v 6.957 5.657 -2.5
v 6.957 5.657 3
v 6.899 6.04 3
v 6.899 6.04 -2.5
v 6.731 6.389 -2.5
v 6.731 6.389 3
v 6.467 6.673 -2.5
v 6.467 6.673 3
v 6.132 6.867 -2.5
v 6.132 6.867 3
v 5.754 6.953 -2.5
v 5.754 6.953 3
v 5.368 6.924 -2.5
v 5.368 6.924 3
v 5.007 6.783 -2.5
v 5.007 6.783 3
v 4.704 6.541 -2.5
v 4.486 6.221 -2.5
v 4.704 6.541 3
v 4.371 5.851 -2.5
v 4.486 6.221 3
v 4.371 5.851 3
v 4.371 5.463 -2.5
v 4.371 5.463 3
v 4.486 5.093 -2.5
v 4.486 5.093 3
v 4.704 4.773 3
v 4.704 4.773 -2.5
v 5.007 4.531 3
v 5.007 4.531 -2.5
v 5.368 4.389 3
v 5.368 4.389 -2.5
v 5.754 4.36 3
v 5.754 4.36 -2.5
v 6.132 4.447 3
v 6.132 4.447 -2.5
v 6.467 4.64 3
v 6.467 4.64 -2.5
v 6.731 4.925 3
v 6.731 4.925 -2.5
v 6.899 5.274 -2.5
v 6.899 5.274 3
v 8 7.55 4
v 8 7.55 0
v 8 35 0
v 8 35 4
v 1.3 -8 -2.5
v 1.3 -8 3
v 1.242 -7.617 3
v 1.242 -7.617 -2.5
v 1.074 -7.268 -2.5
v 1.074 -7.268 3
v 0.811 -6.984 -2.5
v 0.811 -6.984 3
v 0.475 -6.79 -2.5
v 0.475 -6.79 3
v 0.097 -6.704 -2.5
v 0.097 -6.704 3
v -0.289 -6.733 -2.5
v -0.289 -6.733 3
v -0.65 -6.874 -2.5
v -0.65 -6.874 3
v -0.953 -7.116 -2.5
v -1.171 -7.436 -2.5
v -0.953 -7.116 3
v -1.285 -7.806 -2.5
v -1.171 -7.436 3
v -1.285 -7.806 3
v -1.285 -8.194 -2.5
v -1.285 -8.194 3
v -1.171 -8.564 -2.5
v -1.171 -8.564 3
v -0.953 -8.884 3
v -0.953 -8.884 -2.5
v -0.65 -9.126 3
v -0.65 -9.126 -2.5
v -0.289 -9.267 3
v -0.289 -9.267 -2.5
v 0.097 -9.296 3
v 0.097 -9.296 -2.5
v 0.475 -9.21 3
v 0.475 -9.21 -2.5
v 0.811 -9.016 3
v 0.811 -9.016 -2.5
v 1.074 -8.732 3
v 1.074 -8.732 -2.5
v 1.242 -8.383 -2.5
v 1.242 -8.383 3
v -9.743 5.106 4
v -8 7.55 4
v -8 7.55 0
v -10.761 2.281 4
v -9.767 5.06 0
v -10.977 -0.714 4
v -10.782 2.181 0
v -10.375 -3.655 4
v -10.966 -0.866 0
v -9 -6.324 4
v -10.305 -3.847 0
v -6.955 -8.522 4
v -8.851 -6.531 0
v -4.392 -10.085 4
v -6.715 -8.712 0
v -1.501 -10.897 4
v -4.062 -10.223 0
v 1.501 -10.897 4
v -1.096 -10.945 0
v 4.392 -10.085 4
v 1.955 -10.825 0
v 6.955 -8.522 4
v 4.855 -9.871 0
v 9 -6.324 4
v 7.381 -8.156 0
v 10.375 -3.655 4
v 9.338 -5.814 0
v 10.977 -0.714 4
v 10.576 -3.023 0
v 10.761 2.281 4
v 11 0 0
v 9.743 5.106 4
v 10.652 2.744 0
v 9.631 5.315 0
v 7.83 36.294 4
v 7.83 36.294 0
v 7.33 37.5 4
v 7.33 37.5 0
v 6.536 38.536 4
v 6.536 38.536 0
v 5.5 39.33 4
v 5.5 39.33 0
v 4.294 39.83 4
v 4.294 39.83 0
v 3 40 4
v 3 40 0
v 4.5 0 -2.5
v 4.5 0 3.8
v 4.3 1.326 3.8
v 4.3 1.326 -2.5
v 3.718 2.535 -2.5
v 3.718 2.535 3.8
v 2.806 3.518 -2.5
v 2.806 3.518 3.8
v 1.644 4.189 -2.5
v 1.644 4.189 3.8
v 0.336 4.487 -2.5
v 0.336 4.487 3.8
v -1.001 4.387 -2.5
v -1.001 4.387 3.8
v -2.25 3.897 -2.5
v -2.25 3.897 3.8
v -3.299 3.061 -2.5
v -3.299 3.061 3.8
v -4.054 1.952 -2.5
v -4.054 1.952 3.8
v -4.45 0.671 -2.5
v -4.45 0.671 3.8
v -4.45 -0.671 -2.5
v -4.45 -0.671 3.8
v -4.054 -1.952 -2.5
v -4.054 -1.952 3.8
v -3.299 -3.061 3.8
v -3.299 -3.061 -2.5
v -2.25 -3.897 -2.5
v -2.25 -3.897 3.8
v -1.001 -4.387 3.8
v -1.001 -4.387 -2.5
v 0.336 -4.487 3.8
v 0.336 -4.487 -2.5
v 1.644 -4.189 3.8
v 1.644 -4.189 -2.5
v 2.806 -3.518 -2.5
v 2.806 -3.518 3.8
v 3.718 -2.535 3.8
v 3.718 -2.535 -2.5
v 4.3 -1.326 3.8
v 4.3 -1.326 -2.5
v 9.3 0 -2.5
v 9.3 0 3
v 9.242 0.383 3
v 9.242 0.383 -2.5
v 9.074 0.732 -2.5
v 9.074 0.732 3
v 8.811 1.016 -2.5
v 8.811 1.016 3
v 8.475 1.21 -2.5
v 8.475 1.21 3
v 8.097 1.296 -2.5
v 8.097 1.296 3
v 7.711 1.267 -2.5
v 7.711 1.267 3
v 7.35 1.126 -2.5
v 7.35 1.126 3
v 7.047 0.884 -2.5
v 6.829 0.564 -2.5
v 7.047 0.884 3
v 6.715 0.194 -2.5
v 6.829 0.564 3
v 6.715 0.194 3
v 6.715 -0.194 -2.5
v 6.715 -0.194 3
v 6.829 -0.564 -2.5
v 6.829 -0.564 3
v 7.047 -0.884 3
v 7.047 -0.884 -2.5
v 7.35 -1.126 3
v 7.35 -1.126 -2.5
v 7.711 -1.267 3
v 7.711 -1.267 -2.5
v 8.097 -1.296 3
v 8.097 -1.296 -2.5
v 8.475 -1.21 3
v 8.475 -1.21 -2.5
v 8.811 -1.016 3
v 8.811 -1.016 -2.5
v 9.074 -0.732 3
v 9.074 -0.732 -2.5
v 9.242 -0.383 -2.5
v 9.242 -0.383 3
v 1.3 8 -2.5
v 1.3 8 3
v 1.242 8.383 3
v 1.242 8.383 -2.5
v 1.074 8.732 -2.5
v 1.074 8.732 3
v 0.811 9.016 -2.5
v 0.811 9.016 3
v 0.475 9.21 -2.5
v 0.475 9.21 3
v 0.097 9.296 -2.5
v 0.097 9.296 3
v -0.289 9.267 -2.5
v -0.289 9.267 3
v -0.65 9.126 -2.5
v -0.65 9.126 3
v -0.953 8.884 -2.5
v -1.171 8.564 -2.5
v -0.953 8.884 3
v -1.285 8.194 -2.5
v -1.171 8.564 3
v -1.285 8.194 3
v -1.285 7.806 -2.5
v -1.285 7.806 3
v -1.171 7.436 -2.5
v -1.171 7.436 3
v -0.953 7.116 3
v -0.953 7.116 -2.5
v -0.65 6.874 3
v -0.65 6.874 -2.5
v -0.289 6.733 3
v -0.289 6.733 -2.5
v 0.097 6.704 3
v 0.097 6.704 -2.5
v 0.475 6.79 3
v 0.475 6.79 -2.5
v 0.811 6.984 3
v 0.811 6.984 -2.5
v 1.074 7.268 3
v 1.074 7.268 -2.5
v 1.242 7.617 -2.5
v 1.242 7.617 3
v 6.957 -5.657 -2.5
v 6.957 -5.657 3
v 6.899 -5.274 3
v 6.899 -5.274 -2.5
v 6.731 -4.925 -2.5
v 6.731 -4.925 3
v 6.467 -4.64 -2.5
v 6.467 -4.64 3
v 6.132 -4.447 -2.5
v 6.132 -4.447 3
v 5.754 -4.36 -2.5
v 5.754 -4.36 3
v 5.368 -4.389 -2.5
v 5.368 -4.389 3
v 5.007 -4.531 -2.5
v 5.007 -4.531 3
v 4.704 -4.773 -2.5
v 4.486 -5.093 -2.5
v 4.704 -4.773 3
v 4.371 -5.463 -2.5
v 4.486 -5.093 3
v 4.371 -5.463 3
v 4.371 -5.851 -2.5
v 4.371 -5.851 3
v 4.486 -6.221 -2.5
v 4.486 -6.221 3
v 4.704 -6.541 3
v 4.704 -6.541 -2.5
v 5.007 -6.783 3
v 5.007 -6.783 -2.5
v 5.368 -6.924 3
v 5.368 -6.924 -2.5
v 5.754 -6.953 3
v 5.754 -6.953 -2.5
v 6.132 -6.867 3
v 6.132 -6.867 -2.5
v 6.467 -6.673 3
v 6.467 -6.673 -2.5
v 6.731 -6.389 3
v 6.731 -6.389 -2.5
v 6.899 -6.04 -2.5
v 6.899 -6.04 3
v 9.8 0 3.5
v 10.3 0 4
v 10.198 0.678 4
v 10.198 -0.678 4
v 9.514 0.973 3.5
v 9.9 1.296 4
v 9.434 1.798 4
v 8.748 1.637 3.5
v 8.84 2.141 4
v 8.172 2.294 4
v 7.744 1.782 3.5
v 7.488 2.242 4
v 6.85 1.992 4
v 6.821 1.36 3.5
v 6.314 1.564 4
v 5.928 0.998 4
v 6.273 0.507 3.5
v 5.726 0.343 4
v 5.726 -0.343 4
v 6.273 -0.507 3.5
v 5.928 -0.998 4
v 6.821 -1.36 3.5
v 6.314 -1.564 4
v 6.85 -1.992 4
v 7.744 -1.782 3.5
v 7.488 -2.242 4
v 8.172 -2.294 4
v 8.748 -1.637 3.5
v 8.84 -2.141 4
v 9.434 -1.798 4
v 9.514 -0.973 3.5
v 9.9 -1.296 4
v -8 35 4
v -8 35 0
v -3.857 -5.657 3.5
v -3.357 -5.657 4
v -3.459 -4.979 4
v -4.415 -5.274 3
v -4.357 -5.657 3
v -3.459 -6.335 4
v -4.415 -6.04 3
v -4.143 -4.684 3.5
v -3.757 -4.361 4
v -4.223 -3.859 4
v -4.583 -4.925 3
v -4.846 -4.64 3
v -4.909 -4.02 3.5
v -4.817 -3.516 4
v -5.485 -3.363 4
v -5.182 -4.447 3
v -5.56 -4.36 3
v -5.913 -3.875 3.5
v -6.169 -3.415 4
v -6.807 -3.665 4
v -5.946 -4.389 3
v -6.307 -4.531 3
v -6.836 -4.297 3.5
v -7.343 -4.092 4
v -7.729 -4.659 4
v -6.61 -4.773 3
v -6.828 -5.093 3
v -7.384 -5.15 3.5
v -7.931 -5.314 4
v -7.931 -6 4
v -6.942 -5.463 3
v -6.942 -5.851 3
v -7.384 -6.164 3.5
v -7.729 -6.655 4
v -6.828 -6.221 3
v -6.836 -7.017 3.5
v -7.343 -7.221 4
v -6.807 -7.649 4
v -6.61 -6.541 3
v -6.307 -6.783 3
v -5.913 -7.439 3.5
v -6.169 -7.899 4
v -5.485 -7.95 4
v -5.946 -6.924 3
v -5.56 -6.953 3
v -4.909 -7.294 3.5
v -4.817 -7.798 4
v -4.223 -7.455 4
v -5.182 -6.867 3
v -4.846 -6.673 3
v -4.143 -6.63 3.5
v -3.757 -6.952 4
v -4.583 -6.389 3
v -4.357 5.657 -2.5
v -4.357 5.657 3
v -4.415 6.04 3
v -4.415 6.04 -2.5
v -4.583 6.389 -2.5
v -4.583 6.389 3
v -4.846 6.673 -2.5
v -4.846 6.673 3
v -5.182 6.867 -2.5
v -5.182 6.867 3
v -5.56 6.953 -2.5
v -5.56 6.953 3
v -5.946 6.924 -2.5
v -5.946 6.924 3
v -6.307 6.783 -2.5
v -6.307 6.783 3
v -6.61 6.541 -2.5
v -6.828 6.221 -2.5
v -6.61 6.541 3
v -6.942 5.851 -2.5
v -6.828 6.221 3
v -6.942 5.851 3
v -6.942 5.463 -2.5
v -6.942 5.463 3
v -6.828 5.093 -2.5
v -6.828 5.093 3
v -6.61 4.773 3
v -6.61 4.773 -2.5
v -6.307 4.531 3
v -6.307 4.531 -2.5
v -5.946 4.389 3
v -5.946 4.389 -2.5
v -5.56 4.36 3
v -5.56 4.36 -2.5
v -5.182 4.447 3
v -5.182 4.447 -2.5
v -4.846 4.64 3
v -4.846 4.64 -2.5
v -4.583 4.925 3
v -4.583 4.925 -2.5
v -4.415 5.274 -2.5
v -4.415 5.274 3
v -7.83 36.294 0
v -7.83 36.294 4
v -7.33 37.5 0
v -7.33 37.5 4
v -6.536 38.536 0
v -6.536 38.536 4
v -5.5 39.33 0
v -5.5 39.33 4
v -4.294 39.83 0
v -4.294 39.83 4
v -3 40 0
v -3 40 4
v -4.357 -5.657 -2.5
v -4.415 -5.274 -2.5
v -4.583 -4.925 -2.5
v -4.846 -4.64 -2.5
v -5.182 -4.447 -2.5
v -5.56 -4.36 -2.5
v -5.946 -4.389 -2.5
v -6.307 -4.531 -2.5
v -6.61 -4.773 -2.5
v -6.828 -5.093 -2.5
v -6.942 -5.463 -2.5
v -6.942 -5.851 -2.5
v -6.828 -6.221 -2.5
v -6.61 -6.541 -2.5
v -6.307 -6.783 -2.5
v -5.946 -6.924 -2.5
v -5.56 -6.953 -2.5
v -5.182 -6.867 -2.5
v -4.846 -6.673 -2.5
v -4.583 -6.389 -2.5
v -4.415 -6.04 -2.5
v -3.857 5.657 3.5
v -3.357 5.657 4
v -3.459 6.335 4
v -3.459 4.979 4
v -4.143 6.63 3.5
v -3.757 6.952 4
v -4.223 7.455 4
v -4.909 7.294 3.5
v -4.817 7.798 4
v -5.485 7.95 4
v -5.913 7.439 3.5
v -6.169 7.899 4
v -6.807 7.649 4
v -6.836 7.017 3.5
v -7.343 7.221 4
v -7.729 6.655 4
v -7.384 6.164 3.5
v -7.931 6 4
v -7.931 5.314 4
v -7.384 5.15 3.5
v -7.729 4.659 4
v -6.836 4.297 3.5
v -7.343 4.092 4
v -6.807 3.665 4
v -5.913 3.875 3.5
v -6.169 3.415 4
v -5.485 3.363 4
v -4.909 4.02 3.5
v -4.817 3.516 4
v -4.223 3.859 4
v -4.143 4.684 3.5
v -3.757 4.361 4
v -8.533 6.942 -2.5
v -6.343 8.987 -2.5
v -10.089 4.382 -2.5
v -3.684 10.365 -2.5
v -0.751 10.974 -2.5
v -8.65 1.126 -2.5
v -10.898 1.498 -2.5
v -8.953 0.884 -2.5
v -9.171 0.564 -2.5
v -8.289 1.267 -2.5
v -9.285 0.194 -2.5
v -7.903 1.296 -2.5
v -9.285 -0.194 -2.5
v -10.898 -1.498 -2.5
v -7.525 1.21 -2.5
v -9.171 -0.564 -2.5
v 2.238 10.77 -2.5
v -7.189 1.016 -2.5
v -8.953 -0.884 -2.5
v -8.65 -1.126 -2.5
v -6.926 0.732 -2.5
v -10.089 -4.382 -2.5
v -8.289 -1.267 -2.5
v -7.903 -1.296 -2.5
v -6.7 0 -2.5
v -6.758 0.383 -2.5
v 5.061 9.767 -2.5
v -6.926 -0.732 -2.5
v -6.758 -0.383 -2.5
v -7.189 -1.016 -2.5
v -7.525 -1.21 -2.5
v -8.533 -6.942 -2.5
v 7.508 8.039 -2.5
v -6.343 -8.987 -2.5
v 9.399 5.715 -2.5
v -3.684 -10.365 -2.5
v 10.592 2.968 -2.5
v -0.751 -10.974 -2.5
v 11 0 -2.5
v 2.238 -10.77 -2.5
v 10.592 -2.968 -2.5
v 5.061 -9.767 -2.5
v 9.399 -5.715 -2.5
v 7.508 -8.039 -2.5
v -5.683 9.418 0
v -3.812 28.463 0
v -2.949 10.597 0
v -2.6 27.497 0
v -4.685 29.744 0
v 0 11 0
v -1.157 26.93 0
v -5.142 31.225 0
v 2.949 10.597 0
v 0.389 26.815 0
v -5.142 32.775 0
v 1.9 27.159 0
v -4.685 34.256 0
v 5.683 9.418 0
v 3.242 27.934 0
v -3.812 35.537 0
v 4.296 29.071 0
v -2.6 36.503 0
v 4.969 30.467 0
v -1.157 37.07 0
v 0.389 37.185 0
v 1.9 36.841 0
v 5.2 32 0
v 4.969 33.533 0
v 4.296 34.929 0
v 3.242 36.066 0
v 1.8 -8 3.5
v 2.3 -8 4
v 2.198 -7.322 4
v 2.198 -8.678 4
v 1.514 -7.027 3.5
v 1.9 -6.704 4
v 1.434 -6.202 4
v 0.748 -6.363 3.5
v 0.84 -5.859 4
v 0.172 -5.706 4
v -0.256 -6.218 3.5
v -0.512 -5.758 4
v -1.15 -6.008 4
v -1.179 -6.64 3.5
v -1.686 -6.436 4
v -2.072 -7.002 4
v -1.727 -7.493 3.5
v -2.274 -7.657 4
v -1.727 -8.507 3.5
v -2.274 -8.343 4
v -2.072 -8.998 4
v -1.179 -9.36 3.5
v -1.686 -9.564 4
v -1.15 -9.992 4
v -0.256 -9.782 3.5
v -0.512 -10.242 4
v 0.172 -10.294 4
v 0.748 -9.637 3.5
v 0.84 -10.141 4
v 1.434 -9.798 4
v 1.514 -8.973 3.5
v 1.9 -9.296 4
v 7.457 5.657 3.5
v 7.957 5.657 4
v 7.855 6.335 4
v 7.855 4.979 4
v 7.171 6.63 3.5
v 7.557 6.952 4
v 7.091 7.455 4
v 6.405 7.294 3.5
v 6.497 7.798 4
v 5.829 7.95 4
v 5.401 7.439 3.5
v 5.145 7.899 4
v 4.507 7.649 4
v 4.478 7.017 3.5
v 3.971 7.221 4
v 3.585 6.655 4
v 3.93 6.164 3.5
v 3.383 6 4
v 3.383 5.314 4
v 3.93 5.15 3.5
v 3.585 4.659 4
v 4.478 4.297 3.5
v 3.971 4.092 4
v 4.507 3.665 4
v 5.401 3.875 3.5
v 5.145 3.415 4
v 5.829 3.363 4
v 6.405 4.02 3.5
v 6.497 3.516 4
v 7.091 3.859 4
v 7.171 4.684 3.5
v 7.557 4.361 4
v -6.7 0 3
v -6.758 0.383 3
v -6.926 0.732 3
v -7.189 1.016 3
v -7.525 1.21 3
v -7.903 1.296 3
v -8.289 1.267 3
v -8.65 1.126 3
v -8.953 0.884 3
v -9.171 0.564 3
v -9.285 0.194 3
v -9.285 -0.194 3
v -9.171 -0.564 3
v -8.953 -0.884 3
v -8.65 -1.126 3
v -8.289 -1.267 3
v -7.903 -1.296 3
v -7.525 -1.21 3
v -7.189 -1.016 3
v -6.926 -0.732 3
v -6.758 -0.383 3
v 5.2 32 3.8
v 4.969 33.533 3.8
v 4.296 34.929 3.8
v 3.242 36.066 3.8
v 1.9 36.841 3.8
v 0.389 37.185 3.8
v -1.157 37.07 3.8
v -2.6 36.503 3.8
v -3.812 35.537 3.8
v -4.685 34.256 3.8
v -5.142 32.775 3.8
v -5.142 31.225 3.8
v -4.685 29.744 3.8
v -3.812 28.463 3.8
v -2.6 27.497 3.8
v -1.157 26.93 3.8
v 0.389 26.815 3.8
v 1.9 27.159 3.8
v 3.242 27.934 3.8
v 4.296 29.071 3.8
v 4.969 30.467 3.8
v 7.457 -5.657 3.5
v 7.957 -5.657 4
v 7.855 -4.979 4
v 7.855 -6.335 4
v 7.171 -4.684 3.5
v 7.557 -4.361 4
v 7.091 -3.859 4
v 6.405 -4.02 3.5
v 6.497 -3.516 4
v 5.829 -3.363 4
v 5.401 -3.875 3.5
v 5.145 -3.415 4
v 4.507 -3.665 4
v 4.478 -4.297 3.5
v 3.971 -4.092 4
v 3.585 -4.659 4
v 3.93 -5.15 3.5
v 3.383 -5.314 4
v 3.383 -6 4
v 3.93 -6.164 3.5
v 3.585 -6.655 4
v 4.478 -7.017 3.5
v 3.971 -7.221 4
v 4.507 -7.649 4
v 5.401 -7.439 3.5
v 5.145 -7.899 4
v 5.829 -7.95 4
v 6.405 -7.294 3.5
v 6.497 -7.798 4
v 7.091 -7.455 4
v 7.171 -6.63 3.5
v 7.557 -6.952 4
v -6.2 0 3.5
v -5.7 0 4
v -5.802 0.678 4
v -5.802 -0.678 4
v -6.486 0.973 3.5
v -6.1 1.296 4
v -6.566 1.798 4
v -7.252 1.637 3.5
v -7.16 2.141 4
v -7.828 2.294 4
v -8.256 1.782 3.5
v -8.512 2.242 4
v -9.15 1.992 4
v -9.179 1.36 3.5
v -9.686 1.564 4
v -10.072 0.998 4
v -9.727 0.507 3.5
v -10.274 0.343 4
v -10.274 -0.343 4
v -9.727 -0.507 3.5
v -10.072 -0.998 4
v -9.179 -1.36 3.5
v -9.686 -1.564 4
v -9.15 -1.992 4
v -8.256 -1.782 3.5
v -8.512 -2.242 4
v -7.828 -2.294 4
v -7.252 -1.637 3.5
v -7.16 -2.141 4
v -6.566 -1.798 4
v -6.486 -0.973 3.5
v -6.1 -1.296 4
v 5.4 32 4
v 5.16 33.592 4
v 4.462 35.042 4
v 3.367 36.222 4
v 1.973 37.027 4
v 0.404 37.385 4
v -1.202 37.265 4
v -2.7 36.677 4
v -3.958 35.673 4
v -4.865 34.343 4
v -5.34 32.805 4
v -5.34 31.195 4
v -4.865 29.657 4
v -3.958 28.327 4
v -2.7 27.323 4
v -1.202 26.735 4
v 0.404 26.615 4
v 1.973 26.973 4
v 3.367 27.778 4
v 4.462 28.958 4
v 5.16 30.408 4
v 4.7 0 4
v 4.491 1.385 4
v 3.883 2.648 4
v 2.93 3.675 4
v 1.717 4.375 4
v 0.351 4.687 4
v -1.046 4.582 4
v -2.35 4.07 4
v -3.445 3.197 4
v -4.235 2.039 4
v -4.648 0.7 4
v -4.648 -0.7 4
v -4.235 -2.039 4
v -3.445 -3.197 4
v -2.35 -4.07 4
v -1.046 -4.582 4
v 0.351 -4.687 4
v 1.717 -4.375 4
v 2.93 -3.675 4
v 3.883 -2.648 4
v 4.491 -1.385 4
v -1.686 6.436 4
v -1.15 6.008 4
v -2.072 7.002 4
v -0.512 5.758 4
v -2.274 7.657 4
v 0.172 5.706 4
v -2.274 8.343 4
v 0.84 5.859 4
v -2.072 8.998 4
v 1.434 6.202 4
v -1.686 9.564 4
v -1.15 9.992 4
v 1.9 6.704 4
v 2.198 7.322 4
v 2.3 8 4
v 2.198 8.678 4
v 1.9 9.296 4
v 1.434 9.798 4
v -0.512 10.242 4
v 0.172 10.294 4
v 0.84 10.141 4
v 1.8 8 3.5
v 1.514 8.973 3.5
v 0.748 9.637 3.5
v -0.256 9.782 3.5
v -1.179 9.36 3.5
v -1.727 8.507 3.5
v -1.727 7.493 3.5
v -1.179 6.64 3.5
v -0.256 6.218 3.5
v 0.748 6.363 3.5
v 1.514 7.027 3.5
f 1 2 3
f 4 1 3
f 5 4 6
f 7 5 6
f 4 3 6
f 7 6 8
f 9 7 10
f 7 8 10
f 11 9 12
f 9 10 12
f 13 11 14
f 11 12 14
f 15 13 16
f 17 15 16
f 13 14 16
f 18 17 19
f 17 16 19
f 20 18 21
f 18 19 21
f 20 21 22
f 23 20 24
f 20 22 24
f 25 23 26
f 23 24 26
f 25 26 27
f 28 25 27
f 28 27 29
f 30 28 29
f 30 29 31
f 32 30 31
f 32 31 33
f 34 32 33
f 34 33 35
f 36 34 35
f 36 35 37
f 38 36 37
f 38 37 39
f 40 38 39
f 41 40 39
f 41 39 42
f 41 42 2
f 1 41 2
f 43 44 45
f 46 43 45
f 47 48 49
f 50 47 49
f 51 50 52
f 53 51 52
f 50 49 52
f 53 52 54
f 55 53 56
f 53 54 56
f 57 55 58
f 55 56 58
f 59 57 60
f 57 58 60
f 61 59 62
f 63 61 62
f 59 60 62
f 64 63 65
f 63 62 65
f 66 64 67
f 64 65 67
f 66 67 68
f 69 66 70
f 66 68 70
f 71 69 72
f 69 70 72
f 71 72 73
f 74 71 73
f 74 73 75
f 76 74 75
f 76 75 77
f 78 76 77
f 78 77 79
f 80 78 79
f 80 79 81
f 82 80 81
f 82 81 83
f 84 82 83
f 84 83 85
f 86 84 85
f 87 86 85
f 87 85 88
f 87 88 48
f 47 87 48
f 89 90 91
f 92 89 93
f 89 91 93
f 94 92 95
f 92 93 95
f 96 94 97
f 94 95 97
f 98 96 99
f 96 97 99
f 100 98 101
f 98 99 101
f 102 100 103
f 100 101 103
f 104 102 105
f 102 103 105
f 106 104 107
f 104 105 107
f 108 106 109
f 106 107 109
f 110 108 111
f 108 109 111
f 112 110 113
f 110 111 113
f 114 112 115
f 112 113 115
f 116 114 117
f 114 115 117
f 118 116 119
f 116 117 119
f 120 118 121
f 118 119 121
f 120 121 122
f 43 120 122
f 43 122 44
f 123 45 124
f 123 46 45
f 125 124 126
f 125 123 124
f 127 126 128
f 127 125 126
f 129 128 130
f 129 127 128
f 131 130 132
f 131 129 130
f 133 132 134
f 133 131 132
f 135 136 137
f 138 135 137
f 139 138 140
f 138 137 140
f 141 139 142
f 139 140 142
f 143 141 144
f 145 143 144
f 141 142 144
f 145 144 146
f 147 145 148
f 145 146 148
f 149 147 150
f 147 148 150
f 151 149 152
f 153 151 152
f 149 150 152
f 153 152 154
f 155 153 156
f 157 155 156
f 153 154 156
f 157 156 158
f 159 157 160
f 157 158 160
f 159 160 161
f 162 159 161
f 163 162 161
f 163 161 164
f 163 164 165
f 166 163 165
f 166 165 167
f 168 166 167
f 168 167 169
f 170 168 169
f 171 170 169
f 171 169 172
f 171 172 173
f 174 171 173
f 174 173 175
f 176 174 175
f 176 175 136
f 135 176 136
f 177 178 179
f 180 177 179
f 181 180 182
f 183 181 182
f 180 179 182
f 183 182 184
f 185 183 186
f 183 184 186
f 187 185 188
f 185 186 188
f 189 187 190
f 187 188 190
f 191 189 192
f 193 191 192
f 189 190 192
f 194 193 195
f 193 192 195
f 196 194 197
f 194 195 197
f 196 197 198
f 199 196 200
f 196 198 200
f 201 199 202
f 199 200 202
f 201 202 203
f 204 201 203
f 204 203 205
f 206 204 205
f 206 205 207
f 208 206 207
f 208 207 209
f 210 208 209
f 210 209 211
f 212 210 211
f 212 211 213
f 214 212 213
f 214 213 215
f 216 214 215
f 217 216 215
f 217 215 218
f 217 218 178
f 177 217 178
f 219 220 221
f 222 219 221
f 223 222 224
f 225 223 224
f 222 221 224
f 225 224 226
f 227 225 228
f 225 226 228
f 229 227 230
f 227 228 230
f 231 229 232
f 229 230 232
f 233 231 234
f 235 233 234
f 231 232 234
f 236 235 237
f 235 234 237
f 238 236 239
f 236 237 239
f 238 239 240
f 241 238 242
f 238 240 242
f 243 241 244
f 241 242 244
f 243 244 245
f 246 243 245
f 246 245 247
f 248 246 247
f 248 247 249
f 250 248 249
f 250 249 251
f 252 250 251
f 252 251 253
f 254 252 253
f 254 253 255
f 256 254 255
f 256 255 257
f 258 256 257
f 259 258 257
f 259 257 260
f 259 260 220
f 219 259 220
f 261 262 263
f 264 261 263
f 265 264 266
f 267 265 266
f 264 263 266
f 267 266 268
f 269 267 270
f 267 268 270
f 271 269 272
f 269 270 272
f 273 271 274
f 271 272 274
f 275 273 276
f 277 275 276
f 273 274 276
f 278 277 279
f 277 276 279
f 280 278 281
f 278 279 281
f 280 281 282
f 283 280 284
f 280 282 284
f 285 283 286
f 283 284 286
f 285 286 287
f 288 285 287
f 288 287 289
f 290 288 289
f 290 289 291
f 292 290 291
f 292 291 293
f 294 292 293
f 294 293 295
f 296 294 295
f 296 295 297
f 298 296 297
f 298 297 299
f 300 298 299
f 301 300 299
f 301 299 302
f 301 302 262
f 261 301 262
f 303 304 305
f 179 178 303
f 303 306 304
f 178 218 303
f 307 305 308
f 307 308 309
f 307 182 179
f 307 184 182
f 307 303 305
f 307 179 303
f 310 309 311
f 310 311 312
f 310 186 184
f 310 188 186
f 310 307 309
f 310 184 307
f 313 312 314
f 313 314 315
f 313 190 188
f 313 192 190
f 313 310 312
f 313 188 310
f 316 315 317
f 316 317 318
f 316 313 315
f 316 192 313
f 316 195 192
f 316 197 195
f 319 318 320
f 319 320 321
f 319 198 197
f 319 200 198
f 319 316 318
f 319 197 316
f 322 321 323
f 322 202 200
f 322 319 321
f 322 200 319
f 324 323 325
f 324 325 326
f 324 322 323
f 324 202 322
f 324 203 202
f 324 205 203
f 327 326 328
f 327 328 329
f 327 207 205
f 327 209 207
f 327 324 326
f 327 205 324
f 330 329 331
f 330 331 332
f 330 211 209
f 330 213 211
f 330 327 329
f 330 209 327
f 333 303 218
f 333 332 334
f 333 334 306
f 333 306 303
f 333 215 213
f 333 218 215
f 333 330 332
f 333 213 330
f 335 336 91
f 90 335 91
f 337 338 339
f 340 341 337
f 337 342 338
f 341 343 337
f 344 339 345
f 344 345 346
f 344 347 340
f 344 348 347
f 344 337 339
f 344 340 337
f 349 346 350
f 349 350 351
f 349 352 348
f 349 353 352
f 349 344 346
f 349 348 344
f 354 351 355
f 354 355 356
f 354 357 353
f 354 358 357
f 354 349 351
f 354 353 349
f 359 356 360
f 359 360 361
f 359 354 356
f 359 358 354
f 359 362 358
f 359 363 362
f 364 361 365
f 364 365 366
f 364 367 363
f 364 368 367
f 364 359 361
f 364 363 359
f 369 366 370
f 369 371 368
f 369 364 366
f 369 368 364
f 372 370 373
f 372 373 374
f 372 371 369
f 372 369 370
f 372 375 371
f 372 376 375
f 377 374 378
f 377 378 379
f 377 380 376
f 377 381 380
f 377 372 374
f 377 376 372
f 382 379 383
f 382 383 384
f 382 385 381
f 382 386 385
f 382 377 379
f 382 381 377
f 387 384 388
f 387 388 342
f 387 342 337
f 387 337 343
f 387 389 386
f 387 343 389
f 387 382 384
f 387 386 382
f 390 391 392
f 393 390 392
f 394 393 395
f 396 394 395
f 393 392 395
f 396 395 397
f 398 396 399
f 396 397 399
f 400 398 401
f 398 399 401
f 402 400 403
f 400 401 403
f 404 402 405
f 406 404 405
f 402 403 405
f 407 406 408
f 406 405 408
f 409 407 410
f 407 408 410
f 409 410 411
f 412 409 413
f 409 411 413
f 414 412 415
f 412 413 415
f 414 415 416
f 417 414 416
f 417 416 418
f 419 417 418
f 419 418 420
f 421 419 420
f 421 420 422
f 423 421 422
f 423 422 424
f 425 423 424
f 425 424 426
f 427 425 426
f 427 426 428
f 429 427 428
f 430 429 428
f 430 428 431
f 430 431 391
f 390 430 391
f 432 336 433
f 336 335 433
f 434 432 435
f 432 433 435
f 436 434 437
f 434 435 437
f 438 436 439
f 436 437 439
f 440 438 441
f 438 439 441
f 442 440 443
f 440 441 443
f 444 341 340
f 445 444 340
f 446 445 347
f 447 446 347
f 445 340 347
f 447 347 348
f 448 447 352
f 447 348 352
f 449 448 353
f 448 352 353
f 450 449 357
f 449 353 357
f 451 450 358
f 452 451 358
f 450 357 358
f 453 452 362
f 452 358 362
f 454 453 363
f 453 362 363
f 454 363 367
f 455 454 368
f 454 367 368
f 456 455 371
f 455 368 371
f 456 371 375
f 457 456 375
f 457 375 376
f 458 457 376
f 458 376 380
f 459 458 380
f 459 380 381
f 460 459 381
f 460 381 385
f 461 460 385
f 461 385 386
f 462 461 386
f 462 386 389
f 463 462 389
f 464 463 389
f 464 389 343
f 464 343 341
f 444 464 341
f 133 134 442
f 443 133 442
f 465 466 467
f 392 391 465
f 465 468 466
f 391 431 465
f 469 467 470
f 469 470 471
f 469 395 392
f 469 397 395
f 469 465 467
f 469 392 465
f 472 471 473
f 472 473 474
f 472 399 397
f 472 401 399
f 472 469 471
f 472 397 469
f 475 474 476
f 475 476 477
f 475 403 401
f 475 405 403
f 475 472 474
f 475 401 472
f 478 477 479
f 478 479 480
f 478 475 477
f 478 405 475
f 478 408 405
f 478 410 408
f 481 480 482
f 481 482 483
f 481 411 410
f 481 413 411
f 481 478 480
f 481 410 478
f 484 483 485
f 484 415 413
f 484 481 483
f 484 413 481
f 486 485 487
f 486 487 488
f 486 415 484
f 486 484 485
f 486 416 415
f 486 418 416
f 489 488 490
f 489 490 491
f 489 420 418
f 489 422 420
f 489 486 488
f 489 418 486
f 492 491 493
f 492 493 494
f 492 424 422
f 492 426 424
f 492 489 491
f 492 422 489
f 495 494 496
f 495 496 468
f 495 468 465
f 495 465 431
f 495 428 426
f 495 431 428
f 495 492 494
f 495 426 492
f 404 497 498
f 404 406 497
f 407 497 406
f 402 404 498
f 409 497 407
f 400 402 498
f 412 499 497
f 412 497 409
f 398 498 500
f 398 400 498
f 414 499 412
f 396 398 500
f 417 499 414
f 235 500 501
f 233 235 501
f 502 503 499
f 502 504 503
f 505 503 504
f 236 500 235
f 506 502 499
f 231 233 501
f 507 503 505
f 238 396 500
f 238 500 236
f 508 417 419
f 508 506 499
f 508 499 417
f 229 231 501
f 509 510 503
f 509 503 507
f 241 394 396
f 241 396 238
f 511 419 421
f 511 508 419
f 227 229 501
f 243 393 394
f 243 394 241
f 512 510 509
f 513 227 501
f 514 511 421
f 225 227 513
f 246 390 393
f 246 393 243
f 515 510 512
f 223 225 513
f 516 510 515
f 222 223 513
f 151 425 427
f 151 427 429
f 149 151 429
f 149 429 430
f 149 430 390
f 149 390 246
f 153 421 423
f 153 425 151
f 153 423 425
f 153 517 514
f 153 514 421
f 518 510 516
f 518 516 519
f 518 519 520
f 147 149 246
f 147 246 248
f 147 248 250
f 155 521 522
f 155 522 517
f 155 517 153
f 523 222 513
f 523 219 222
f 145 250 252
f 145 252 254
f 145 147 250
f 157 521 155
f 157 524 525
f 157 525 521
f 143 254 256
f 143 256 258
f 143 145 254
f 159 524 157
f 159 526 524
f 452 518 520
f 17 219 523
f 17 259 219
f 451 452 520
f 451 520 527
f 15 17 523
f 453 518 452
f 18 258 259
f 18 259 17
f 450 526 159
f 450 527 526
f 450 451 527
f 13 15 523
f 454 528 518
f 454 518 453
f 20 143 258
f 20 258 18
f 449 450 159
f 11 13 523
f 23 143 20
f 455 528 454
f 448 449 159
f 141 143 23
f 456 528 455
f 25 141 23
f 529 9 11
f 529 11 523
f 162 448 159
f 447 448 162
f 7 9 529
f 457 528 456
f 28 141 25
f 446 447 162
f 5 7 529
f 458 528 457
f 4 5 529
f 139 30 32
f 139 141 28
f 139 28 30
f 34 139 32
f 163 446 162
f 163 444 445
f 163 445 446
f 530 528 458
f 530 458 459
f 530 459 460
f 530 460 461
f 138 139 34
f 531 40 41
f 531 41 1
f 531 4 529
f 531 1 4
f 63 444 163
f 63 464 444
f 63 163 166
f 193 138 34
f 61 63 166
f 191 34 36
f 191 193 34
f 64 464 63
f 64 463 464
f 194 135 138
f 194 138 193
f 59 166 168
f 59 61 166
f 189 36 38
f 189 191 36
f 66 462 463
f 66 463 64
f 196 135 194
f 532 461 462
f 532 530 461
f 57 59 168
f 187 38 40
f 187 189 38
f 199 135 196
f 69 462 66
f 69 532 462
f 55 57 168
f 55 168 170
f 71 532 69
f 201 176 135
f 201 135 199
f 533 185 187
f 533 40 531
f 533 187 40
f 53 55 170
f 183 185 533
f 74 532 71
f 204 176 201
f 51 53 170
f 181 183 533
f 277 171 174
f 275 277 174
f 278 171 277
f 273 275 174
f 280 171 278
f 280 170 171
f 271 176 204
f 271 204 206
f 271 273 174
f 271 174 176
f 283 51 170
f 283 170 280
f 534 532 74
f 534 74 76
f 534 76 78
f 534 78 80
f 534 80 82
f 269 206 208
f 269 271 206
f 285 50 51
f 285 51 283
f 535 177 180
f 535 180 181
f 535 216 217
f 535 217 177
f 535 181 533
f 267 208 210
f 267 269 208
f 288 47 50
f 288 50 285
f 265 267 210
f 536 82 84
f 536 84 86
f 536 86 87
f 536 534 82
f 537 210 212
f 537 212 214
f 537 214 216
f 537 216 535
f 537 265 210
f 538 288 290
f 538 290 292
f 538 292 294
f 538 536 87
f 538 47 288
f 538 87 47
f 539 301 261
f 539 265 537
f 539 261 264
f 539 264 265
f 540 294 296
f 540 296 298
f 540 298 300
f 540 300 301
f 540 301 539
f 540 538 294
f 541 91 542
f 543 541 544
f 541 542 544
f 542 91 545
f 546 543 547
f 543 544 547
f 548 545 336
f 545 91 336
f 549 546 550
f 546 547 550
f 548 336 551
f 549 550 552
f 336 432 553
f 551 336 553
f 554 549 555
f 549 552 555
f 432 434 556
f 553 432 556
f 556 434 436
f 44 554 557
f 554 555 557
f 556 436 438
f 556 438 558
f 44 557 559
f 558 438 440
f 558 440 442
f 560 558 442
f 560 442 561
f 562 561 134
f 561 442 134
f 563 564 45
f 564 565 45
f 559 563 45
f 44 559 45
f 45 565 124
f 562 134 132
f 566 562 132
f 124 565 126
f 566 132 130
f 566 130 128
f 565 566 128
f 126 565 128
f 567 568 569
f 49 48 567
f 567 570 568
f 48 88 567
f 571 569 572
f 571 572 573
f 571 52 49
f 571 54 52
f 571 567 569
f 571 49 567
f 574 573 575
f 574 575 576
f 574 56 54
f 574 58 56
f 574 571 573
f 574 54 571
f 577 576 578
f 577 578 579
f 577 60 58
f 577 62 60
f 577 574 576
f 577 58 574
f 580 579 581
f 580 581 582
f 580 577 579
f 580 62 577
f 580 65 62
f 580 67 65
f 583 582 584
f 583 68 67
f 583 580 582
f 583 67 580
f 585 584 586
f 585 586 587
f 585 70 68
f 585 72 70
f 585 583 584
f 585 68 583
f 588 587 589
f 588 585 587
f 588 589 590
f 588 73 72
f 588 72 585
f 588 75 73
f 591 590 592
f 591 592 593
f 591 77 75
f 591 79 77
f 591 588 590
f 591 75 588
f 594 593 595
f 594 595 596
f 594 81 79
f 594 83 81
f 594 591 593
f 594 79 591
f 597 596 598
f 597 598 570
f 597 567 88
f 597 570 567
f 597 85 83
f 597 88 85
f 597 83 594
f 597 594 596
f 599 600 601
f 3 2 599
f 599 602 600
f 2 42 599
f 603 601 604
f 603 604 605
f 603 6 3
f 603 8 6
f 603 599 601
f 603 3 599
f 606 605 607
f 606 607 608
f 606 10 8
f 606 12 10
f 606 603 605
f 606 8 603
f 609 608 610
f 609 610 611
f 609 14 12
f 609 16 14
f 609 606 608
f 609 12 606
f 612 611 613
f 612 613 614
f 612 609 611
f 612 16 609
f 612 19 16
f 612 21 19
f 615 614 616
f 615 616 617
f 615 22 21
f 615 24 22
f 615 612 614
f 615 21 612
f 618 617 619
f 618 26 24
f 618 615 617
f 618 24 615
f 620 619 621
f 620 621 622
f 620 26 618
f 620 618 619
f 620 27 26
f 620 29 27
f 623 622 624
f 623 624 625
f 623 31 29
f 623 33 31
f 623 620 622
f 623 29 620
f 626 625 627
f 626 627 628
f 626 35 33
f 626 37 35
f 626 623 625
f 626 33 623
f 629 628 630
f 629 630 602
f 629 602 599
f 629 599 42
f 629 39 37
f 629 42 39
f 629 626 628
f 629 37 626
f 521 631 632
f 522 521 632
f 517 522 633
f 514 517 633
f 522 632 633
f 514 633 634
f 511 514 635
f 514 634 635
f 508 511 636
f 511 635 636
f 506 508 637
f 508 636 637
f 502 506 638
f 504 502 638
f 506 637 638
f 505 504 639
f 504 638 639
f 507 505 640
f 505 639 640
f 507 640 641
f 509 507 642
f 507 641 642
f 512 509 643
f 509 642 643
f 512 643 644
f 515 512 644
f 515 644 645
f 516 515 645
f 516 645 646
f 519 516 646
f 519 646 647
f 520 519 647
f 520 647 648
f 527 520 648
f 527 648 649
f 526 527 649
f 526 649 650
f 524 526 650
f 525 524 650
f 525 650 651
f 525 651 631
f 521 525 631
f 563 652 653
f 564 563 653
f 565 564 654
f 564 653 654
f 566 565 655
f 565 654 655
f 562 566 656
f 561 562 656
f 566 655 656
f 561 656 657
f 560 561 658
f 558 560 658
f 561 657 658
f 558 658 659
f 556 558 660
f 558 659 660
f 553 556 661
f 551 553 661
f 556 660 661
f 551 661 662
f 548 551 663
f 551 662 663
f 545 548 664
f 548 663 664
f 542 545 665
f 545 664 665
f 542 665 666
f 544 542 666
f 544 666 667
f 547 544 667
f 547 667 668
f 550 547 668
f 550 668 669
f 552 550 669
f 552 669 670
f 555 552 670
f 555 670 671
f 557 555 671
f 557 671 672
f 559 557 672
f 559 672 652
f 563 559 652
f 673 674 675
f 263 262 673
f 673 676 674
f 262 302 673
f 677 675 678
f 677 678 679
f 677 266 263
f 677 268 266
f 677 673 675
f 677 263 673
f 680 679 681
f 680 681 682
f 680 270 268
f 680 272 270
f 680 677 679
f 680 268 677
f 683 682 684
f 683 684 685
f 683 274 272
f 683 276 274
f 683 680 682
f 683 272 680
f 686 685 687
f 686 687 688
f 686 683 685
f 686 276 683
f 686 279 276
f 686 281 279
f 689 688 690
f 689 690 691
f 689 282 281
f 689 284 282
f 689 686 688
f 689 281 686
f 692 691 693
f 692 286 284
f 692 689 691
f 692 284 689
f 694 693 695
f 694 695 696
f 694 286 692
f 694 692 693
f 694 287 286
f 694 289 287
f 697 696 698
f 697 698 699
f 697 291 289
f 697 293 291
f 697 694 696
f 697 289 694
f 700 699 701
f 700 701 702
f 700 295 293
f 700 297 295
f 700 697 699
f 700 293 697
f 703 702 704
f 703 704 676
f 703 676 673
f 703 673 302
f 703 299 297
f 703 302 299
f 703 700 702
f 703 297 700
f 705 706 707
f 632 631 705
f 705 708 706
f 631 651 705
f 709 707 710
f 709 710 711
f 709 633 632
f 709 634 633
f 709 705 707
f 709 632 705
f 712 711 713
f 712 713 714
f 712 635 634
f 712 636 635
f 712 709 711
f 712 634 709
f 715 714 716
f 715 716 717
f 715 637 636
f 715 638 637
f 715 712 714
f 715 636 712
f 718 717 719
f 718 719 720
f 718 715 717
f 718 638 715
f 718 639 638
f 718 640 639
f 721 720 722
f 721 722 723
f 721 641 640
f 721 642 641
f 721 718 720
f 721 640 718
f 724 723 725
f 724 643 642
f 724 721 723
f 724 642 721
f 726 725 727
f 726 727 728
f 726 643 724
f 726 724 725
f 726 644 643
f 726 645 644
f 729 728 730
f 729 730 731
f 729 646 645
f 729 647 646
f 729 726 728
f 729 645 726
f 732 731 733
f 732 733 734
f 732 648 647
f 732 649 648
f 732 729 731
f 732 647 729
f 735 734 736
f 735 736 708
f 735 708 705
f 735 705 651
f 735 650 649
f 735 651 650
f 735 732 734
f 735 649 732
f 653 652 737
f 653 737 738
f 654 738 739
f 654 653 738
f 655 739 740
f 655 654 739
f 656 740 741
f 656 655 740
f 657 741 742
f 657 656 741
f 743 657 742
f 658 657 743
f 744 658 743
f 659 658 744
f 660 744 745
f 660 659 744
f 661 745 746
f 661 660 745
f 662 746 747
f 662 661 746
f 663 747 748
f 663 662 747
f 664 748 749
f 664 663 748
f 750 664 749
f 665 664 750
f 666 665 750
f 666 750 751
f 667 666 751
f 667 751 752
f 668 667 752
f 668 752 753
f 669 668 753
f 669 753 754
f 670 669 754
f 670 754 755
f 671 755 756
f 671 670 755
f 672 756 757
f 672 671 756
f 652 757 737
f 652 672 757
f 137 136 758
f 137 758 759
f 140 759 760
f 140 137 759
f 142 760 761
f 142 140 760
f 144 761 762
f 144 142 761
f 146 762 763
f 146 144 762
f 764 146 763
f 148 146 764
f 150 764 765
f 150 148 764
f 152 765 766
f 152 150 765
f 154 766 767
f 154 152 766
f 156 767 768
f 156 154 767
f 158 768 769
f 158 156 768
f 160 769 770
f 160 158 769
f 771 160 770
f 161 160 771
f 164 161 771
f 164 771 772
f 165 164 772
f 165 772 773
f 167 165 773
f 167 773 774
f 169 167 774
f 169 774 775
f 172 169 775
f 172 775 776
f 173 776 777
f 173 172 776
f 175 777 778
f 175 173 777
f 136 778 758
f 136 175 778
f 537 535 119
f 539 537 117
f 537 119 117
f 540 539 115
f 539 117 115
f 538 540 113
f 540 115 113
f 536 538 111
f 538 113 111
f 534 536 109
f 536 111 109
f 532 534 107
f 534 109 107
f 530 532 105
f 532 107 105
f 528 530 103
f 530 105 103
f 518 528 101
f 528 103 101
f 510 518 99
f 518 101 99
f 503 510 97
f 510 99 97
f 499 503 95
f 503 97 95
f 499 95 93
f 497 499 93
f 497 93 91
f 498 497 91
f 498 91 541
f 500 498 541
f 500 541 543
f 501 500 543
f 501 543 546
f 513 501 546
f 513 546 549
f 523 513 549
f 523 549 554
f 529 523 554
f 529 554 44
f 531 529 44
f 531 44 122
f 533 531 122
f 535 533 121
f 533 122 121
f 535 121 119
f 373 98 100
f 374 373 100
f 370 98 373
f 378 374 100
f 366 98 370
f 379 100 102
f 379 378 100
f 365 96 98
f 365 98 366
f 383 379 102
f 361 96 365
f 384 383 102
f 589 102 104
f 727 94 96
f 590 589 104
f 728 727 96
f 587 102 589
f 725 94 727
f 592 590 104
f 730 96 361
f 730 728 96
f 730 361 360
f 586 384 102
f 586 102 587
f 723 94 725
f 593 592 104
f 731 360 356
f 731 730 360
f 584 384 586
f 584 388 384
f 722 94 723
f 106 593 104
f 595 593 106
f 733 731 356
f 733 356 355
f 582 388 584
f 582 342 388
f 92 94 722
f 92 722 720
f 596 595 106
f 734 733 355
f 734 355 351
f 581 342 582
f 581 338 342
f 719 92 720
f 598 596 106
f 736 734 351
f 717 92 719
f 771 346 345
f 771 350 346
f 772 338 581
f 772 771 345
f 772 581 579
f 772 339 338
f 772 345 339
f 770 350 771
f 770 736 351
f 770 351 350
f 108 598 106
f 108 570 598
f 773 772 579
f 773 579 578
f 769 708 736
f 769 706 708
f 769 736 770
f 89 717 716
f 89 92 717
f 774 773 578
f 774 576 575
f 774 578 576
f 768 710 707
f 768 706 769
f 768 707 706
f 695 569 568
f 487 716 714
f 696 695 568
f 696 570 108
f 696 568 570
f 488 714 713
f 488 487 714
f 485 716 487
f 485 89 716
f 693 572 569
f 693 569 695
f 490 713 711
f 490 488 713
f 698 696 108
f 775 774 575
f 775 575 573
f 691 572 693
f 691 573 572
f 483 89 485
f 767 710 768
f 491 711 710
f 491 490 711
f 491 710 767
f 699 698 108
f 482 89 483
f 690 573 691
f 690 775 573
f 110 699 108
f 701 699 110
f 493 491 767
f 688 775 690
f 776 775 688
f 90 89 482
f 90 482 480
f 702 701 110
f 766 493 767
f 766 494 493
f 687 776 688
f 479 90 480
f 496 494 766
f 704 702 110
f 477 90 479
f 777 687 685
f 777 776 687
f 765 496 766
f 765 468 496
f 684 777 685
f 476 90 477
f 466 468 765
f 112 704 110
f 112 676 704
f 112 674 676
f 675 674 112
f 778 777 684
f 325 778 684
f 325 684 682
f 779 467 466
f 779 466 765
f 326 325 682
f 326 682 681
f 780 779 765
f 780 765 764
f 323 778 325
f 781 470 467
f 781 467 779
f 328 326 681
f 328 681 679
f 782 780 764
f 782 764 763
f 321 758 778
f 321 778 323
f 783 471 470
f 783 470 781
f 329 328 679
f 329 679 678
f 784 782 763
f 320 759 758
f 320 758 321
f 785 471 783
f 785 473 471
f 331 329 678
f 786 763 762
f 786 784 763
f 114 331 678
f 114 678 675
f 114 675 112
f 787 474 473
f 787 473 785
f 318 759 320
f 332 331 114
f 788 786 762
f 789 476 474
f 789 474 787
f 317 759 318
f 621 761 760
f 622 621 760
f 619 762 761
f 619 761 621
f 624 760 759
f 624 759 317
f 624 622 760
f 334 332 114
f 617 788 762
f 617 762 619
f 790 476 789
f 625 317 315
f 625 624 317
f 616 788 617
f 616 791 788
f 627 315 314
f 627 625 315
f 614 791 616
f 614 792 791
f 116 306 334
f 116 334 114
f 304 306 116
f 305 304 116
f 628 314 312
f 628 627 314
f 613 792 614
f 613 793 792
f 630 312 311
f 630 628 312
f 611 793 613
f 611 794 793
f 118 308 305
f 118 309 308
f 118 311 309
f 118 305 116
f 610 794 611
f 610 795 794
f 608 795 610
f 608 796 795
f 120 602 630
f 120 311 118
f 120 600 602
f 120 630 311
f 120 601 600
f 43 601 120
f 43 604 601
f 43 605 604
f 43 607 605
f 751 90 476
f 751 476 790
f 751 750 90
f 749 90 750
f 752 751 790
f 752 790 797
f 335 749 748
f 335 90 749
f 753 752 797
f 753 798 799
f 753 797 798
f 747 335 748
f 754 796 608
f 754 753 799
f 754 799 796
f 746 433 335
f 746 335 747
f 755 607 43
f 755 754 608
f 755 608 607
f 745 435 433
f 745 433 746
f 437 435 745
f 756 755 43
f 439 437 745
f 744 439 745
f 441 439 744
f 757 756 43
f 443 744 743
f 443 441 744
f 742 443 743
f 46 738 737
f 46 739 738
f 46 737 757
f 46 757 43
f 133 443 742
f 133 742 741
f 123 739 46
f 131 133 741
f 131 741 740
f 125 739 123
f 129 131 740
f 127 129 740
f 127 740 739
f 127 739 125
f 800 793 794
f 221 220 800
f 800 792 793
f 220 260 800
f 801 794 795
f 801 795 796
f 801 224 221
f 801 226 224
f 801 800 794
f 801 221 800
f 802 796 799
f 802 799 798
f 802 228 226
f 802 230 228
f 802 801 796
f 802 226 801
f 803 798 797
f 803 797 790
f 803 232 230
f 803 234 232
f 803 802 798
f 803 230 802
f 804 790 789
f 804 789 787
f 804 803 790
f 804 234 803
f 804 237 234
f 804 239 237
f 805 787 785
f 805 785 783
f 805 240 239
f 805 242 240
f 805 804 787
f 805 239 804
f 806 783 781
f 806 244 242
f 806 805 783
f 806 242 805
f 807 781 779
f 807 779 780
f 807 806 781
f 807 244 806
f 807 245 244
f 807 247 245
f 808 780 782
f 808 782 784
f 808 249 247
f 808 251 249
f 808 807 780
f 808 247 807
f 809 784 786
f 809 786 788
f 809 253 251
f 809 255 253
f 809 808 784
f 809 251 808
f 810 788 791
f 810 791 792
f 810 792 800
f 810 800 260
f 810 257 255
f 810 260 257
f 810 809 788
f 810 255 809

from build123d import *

# Parameters (mm, degrees)
PAD_DEPTH       = 4
SKETCH003_R     = 5.2
POCKET_DEPTH    = 5
FILLET_R        = 5
SKETCH004_R     = 11
PAD001_DEPTH    = 2.5
SKETCH002_R     = 4.5
SKETCH002_R_2   = 1.3
POCKET001_DEPTH = 10
CHAMFER_SIZE    = 1
CHAMFER001_SIZE = 0.2


with BuildPart() as part:
    # Sketch → Pad (new body)
    with BuildSketch(Plane.XY):
        with BuildLine():
            ThreePointArc((-8, 7.549834), (0, -11), (8, 7.549834))
            Line((8, 7.549834), (8, 40))
            Line((8, 40), (-8, 40))
            Line((-8, 40), (-8, 7.549834))
        make_face()
    extrude(amount=PAD_DEPTH)

    # Sketch003 → Pocket (cut)
    with BuildSketch(Plane.XY.offset(4)):
        with Locations((0, 32)):
            Circle(SKETCH003_R)
    extrude(amount=-POCKET_DEPTH, mode=Mode.SUBTRACT)

    # Fillet
    fillet_edges = [part.edges().sort_by_distance(p)[0] for p in [
        (-8, 40, 2),
        (8, 40, 2),
    ]]
    fillet(fillet_edges, radius=FILLET_R)

    # Sketch004 → Pad001 (join)
    with BuildSketch(Plane(origin=(0, 0, 0), x_dir=(1, 0, 0), z_dir=(0, 0, -1))):
        Circle(SKETCH004_R)
    extrude(amount=PAD001_DEPTH)

    # Sketch002 (on Face5 of Pad001) → Pocket001 (cut)
    with BuildSketch(Plane.XY.offset(4)):
        Circle(SKETCH002_R)
        with Locations((0, 8)):
            Circle(SKETCH002_R_2)
        with Locations((5.656854, 5.656854)):
            Circle(SKETCH002_R_2)
        with Locations((8, 0)):
            Circle(SKETCH002_R_2)
        with Locations((5.656854, -5.656854)):
            Circle(SKETCH002_R_2)
        with Locations((0, -8)):
            Circle(SKETCH002_R_2)
        with Locations((-5.656854, -5.656854)):
            Circle(SKETCH002_R_2)
        with Locations((-8, 0)):
            Circle(SKETCH002_R_2)
        with Locations((-5.656854, 5.656854)):
            Circle(SKETCH002_R_2)
    extrude(amount=-POCKET001_DEPTH, mode=Mode.SUBTRACT)

    # Chamfer
    chamfer_edges = [part.edges().sort_by_distance(p)[0] for p in [
        (-6.956854, 5.656854, 4),
        (-1.3, 8, 4),
        (4.356854, 5.656854, 4),
        (6.7, 0, 4),
        (4.356854, -5.656854, 4),
        (-1.3, -8, 4),
        (-6.956854, -5.656854, 4),
        (-9.3, 0, 4),
    ]]
    chamfer(chamfer_edges, length=CHAMFER_SIZE)

    # Chamfer001
    chamfer001_edges = [part.edges().sort_by_distance(p)[0] for p in [
        (-5.2, 32, 4),
        (-4.5, 0, 4),
    ]]
    chamfer(chamfer001_edges, length=CHAMFER001_SIZE)


solid = part.part
